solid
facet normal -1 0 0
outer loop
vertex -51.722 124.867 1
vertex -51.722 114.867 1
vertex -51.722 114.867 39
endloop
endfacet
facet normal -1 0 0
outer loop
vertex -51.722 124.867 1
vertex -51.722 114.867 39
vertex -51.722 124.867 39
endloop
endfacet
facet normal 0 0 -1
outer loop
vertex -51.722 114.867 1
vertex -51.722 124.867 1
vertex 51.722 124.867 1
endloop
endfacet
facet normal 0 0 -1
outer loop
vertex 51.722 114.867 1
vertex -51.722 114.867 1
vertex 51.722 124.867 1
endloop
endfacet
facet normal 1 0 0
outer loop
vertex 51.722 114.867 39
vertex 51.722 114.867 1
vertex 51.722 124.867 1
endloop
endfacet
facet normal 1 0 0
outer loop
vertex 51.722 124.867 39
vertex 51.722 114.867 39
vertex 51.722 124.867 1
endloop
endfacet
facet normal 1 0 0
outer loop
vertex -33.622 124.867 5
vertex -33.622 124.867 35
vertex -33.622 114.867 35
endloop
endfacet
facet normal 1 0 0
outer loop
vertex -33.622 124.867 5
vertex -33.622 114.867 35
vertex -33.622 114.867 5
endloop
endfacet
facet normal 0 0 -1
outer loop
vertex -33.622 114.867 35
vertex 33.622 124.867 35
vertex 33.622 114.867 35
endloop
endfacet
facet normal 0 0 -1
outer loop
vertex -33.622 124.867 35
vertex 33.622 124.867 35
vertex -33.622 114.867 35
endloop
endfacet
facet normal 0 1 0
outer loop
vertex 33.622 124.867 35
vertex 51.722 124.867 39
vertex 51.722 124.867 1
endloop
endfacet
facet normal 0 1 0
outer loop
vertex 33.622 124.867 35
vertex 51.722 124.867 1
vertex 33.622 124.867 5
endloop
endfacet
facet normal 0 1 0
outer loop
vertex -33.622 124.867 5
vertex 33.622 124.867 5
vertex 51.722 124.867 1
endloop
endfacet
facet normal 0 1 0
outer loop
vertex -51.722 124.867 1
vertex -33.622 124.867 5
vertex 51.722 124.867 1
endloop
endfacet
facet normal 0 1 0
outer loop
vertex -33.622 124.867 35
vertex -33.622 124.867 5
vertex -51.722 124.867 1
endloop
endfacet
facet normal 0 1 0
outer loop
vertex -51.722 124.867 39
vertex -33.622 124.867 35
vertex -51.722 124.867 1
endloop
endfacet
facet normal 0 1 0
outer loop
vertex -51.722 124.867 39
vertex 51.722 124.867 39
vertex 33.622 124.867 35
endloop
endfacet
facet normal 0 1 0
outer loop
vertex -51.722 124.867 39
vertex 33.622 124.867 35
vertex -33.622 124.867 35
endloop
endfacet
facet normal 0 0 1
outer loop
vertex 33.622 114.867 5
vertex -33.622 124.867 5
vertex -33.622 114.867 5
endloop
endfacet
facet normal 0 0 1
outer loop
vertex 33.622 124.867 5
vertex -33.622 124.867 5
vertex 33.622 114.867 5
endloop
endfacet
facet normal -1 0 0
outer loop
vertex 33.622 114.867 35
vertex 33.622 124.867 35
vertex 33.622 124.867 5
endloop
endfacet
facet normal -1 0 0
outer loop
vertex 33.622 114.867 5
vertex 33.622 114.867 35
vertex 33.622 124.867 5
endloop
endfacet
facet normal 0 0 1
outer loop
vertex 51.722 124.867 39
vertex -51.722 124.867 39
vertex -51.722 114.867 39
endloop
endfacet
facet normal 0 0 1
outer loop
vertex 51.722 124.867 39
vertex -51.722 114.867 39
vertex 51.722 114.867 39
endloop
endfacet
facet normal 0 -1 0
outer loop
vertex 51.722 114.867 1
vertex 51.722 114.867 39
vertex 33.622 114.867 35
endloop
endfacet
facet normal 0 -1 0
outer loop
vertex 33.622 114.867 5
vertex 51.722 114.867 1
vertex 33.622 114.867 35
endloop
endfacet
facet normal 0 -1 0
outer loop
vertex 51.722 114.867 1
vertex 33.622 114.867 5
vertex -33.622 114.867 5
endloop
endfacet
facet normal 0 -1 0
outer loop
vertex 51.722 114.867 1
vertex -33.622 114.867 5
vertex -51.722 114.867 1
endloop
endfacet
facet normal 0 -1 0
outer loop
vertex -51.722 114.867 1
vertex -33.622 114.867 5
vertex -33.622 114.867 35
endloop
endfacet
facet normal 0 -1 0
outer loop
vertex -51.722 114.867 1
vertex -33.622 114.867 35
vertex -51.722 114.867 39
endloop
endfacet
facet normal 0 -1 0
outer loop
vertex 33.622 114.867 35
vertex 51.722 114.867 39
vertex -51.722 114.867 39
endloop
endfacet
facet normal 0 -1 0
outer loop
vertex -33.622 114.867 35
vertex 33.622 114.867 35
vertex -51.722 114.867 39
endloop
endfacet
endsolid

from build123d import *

# Parameters (mm, degrees)
SKETCH5_W           = 103.443318868
SKETCH5_H           = 10
EXTRUDE_THIN1_DEPTH = 66
SKETCH7_W           = 67.24350567
SKETCH7_H           = 56
CUT_EXTRUDE2_DEPTH  = 10
SKETCH8_W           = 67.24350567
SKETCH8_H           = 10
BOSS_EXTRUDE1_DEPTH = 26
SKETCH9_W           = 103.443318868
SKETCH9_H           = 27
SKETCH9_H_2         = 1
CUT_EXTRUDE3_DEPTH  = 10


with BuildPart() as part:
    # Sketch5 → Extrude-Thin1 (new body)
    with BuildSketch(Plane.XY):
        with Locations((0, 119.867131674)):
            Rectangle(SKETCH5_W, SKETCH5_H)
    extrude(amount=EXTRUDE_THIN1_DEPTH)

    # Sketch7 → Cut-Extrude2 (cut)
    with BuildSketch(Plane(origin=(0, 124.867131674, 0), x_dir=(1, 0, 0), z_dir=(0, 1, 0))):
        with Locations((0, -33)):
            Rectangle(SKETCH7_W, SKETCH7_H)
    extrude(amount=-CUT_EXTRUDE2_DEPTH, mode=Mode.SUBTRACT)

    # Sketch8 → Boss-Extrude1 (add)
    with BuildSketch(Plane(origin=(0, 0, 61), x_dir=(-1, 0, 0), z_dir=(0, 0, -1))):
        with Locations((0, 119.867131674)):
            Rectangle(SKETCH8_W, SKETCH8_H)
    extrude(amount=BOSS_EXTRUDE1_DEPTH)

    # Sketch9 → Cut-Extrude3 (cut)
    with BuildSketch(Plane(origin=(0, 124.867131674, 0), x_dir=(1, 0, 0), z_dir=(0, 1, 0))):
        with Locations((0, -52.5)):
            Rectangle(SKETCH9_W, SKETCH9_H)
        with Locations((0, -0.5)):
            Rectangle(SKETCH9_W, SKETCH9_H_2)
    extrude(amount=-CUT_EXTRUDE3_DEPTH, mode=Mode.SUBTRACT)


solid = part.part
